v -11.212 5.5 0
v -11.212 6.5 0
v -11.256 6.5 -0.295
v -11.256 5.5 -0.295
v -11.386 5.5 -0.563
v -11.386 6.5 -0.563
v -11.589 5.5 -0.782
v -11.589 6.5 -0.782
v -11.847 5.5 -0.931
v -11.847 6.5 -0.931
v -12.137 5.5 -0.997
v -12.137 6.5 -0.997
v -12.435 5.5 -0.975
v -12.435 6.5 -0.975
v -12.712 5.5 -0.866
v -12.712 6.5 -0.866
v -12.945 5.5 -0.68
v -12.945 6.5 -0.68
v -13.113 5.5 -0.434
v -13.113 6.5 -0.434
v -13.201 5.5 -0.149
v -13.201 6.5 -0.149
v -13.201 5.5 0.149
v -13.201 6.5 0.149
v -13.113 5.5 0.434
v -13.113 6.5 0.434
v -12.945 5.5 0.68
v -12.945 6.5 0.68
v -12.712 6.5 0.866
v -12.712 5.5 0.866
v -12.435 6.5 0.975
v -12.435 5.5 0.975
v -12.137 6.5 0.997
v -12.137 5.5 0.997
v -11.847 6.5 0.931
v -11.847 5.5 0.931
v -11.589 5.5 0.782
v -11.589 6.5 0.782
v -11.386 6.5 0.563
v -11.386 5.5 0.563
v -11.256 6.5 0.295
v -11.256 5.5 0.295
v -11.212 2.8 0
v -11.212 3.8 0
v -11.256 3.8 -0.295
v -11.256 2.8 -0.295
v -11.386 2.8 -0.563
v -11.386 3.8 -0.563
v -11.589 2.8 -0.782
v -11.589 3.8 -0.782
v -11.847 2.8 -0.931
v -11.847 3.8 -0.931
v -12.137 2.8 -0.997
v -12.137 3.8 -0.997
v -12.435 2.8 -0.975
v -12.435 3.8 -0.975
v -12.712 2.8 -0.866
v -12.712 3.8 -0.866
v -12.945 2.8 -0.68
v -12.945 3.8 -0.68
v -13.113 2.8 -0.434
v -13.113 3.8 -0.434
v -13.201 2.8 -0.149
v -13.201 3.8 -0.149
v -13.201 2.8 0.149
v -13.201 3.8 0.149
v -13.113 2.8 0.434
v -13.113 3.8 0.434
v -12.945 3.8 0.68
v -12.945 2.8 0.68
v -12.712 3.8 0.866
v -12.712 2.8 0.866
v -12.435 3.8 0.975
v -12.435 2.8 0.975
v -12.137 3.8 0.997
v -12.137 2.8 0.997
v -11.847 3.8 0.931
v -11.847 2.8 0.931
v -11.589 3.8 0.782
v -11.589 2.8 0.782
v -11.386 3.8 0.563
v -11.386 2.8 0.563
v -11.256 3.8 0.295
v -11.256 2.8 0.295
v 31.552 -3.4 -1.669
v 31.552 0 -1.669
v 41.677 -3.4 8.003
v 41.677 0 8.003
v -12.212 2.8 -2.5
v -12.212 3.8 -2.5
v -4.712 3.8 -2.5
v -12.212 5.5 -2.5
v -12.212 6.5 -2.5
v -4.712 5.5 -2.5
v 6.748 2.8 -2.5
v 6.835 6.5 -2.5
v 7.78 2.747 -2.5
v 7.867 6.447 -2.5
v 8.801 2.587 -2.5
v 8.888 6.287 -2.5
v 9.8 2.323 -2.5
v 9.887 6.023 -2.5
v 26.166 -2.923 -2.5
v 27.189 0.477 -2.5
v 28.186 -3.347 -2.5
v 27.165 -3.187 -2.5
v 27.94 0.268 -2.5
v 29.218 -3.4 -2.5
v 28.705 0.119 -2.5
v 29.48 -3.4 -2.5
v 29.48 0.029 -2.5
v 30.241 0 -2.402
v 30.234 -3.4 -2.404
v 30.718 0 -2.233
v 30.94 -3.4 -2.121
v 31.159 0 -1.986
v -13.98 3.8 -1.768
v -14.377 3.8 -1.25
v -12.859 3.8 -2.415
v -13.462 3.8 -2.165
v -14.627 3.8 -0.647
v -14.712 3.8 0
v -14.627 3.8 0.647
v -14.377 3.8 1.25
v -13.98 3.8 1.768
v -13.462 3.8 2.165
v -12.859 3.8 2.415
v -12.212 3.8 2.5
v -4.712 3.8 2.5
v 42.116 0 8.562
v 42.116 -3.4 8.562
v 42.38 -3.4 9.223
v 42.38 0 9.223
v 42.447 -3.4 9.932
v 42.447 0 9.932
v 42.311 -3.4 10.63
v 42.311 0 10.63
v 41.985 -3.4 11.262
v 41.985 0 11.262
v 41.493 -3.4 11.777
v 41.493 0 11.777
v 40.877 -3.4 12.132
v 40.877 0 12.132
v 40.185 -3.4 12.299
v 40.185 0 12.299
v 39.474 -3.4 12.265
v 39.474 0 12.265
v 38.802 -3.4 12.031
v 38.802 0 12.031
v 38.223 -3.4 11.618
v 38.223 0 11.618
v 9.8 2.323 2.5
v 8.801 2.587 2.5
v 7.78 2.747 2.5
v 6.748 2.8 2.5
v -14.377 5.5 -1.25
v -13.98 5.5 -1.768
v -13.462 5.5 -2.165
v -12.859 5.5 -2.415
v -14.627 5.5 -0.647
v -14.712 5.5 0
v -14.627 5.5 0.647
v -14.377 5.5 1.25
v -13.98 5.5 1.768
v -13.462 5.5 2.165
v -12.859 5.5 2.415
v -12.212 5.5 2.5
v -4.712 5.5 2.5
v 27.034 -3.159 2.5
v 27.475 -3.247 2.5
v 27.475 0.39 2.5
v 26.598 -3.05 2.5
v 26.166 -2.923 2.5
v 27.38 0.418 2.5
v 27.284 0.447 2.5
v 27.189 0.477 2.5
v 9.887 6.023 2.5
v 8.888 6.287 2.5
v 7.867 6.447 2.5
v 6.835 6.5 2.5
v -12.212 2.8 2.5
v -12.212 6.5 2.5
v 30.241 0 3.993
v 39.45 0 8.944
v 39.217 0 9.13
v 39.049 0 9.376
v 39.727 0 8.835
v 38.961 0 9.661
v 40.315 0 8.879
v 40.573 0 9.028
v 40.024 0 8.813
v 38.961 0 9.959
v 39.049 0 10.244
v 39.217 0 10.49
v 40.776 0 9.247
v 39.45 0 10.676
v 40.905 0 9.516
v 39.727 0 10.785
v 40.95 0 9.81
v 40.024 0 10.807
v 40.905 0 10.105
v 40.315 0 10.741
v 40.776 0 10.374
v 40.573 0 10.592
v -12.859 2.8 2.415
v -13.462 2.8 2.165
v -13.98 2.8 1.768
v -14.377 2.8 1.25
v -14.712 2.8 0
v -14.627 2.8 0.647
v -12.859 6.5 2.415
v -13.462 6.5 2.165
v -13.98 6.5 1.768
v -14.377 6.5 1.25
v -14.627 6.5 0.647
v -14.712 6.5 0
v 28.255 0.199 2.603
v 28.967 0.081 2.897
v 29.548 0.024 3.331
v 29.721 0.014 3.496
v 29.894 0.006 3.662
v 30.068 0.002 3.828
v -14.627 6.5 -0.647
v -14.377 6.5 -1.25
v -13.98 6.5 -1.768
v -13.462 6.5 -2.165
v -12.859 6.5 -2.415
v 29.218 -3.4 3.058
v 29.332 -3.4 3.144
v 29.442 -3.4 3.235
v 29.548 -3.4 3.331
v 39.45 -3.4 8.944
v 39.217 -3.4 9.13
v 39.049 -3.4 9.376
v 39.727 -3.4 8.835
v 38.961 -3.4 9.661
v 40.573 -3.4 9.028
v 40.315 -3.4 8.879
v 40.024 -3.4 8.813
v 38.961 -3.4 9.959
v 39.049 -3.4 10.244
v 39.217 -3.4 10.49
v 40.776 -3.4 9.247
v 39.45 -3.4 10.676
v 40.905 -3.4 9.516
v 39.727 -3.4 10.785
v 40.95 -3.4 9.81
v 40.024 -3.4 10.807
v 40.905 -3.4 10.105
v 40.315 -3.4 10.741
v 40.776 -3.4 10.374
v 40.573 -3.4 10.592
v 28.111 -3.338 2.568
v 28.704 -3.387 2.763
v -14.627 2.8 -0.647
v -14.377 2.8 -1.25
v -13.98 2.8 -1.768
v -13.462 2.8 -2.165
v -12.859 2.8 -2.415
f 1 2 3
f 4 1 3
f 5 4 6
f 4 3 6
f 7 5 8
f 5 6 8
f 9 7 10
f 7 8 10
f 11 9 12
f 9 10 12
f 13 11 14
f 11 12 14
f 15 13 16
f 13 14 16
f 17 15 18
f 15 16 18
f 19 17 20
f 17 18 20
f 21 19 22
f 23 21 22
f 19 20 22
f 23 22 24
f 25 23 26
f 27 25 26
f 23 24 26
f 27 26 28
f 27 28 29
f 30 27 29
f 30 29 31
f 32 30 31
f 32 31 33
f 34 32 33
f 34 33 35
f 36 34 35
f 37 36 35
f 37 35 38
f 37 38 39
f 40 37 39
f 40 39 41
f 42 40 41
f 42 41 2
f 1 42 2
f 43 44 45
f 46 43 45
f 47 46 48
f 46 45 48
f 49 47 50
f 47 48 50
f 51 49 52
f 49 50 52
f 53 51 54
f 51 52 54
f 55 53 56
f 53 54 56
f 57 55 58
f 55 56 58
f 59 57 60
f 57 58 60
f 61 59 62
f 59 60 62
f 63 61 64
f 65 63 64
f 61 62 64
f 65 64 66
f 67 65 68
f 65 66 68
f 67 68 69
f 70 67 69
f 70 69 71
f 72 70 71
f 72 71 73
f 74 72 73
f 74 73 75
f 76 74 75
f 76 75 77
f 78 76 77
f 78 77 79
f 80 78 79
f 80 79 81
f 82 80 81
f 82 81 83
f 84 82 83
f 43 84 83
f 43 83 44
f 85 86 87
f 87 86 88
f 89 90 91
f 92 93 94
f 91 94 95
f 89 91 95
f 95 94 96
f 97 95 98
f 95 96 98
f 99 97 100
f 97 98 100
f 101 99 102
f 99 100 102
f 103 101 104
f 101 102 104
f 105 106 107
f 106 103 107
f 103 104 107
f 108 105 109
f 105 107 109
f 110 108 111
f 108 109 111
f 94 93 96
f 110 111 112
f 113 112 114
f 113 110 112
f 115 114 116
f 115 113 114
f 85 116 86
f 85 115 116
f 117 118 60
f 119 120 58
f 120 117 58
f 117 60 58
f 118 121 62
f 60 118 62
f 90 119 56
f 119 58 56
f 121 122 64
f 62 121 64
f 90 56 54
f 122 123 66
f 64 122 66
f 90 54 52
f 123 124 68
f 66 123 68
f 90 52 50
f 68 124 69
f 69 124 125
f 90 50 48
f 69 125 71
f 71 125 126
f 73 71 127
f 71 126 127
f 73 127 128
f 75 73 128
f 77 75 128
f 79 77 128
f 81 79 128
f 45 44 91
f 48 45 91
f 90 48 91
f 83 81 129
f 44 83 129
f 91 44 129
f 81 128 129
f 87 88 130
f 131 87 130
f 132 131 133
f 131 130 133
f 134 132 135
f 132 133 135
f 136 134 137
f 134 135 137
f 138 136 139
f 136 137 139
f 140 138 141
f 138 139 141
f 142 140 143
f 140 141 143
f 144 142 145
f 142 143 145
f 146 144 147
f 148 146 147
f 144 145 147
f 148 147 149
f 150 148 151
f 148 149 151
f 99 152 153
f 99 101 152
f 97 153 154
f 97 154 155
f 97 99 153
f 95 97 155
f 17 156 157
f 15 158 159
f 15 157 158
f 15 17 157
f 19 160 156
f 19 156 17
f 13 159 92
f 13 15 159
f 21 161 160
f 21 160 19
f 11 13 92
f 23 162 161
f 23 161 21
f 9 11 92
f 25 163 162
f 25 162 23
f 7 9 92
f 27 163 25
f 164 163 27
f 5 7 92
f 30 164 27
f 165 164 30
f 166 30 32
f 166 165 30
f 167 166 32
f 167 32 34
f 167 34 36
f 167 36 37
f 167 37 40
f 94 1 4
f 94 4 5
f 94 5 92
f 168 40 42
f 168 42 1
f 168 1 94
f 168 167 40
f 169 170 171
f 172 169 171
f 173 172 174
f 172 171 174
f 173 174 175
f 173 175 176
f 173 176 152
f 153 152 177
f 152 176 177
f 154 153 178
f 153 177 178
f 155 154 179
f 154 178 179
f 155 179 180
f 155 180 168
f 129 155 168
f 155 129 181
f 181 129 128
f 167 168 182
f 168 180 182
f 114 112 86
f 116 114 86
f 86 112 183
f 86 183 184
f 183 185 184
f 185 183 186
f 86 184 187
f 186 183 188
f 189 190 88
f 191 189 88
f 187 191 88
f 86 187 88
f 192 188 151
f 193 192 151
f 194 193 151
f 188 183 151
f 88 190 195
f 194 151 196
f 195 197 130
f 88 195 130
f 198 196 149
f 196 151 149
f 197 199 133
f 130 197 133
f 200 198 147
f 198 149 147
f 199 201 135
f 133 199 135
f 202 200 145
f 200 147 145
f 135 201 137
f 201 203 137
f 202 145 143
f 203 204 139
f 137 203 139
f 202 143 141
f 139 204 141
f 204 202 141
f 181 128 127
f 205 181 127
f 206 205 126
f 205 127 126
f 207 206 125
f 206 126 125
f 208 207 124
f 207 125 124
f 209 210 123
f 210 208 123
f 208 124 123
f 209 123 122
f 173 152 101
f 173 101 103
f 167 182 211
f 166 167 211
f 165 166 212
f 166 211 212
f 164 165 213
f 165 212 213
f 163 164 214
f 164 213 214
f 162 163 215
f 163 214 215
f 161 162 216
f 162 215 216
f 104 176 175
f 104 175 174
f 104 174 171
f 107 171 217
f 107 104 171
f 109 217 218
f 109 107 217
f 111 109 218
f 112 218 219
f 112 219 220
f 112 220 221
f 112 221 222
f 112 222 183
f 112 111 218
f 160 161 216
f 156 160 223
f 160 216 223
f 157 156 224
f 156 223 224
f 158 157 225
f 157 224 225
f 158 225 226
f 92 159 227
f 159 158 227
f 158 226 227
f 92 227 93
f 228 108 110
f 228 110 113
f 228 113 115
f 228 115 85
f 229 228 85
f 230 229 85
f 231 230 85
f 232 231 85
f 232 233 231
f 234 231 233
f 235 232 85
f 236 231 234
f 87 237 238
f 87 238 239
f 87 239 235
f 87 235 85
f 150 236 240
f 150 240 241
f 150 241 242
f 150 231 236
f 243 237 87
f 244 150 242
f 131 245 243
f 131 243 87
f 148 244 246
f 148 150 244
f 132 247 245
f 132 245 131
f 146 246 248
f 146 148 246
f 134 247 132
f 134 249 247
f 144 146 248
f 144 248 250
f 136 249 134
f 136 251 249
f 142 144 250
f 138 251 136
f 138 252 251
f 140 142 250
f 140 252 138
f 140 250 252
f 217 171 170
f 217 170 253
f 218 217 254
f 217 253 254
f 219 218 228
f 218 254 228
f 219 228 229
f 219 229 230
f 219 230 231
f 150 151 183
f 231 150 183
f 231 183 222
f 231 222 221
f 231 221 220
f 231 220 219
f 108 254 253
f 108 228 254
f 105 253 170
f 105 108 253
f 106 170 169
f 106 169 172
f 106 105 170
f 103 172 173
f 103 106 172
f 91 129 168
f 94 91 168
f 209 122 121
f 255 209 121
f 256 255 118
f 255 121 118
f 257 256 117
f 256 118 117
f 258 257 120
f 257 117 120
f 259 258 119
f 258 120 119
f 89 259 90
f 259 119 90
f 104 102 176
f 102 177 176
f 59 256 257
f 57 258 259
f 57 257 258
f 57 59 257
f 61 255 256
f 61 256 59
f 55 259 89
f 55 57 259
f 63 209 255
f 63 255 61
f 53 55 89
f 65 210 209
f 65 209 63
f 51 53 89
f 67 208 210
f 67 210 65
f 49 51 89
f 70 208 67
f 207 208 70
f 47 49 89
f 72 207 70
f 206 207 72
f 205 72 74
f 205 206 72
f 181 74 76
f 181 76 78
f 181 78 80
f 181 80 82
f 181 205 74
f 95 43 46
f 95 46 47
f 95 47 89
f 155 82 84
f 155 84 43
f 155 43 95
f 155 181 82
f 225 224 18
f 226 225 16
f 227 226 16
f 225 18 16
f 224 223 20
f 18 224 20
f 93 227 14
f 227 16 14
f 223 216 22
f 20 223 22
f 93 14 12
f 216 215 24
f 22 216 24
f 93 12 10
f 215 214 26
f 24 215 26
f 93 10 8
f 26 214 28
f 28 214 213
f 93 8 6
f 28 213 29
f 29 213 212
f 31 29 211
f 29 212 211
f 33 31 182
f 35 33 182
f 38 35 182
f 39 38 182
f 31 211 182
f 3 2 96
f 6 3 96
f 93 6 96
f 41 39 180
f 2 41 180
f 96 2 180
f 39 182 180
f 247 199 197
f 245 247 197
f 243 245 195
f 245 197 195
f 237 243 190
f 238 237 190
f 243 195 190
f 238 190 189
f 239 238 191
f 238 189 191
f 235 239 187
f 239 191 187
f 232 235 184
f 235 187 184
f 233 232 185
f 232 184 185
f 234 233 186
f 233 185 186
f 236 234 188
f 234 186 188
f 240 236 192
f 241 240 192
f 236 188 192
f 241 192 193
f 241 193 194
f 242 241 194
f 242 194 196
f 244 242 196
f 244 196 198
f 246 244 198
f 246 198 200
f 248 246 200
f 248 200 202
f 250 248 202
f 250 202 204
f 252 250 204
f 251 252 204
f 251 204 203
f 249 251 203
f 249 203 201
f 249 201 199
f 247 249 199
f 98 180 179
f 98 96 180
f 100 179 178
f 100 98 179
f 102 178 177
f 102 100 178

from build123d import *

# Parameters (mm, degrees)
BOSS_EXTRUDE1_DEPTH     = 2.5
BOSS_EXTRUDE2_DEPTH     = 3.4
CUT_EXTRUDE1_DEPTH      = 1
CUT_EXTRUDE1_DEPTH_BACK = 10.9
CUT_EXTRUDE2_DEPTH      = 10.810262799
CUT_EXTRUDE2_DEPTH_BACK = 6
SKETCH5_W               = 10
SKETCH5_H               = 1.7
CUT_EXTRUDE3_DEPTH      = 10.810262799
CUT_EXTRUDE3_DEPTH_BACK = 6
SKETCH6_R               = 1
CUT_EXTRUDE4_DEPTH      = 1
CUT_EXTRUDE4_DEPTH_BACK = 10.9
FILLET1_R               = 10
FILLET2_R               = 3


with BuildPart() as part:
    # Sketch1 → Boss-Extrude1 (new body, symmetric)
    with BuildSketch(Plane.XY):
        Polygon((-14.712036777, 6.5), (8.397963223, 6.5), (28.677963223, 0), (-14.712036777, 0), align=None)
    extrude(amount=BOSS_EXTRUDE1_DEPTH, both=True)

    # Sketch2 → Boss-Extrude2 (add)
    with BuildSketch(Plane.XZ):
        with BuildLine():
            Line((-12.212036777, -2.5), (30.682377195, -2.5))
            Line((30.682377195, -2.5), (41.676502177, 8.002543507))
            ThreePointArc((41.676502177, 8.002543507), (41.757330921, 11.537153346), (38.222721082, 11.617982091))
            Line((38.222721082, 11.617982091), (28.677963223, 2.5))
            Line((28.677963223, 2.5), (-12.212036777, 2.5))
            ThreePointArc((-12.212036777, 2.5), (-14.712036777, 0), (-12.212036777, -2.5))
        make_face()
    extrude(amount=BOSS_EXTRUDE2_DEPTH)

    # Sketch3 → Cut-Extrude1 (cut, two sides)
    with BuildSketch(Plane(origin=(0, 6.5, 0), x_dir=(1, 0, 0), z_dir=(0, 1, 0))) as cut_extrude1_sk:
        with BuildLine():
            ThreePointArc((-14.712036777, 0), (-13.97980373, 1.767766953), (-12.212036777, 2.5))
            Line((-12.212036777, 2.5), (-14.712036777, 2.5))
            Line((-14.712036777, 2.5), (-14.712036777, 0))
        make_face()
        with BuildLine():
            ThreePointArc((-12.212036777, -2.5), (-13.97980373, -1.767766953), (-14.712036777, 0))
            Line((-14.712036777, 0), (-14.712036777, -2.5))
            Line((-14.712036777, -2.5), (-12.212036777, -2.5))
        make_face()
    extrude(amount=CUT_EXTRUDE1_DEPTH, mode=Mode.SUBTRACT)
    extrude(cut_extrude1_sk.sketch, amount=-CUT_EXTRUDE1_DEPTH_BACK, mode=Mode.SUBTRACT)

    # Sketch4 → Cut-Extrude2 (cut, two sides)
    with BuildSketch(Plane.XY.offset(2.5)) as cut_extrude2_sk:
        Polygon((-14.712036777, 2.8), (8.310958279, 2.8), (27.654958279, -3.4), (-14.712036777, -3.4), align=None)
    extrude(amount=CUT_EXTRUDE2_DEPTH, mode=Mode.SUBTRACT)
    extrude(cut_extrude2_sk.sketch, amount=-CUT_EXTRUDE2_DEPTH_BACK, mode=Mode.SUBTRACT)

    # Sketch5 → Cut-Extrude3 (cut, two sides)
    with BuildSketch(Plane.XY.offset(2.5)) as cut_extrude3_sk:
        with Locations((-9.712036777, 4.65)):
            Rectangle(SKETCH5_W, SKETCH5_H)
    extrude(amount=CUT_EXTRUDE3_DEPTH, mode=Mode.SUBTRACT)
    extrude(cut_extrude3_sk.sketch, amount=-CUT_EXTRUDE3_DEPTH_BACK, mode=Mode.SUBTRACT)

    # Sketch6 → Cut-Extrude4 (cut, two sides)
    with BuildSketch(Plane(origin=(0, 6.5, 0), x_dir=(1, 0, 0), z_dir=(0, 1, 0))) as cut_extrude4_sk:
        with Locations((-12.212036777, 0)):
            Circle(SKETCH6_R)
        with Locations((39.94961163, -9.810262799)):
            Circle(SKETCH6_R)
    extrude(amount=CUT_EXTRUDE4_DEPTH, mode=Mode.SUBTRACT)
    extrude(cut_extrude4_sk.sketch, amount=-CUT_EXTRUDE4_DEPTH_BACK, mode=Mode.SUBTRACT)

    # Fillet1
    fillet1_edges = [part.edges().sort_by_distance(p)[0] for p in [
        (28.677963223, 0, 0),
        (8.397963223, 6.5, 0),
        (27.654958279, -3.4, 0),
        (8.310958279, 2.8, 0),
    ]]
    fillet(fillet1_edges, radius=FILLET1_R)

    # Fillet2
    fillet2_edges = [part.edges().sort_by_distance(p)[0] for p in [
        (30.682377195, -1.7, -2.5),
        (28.677963223, -1.631211096, 2.5),
    ]]
    fillet(fillet2_edges, radius=FILLET2_R)


solid = part.part
